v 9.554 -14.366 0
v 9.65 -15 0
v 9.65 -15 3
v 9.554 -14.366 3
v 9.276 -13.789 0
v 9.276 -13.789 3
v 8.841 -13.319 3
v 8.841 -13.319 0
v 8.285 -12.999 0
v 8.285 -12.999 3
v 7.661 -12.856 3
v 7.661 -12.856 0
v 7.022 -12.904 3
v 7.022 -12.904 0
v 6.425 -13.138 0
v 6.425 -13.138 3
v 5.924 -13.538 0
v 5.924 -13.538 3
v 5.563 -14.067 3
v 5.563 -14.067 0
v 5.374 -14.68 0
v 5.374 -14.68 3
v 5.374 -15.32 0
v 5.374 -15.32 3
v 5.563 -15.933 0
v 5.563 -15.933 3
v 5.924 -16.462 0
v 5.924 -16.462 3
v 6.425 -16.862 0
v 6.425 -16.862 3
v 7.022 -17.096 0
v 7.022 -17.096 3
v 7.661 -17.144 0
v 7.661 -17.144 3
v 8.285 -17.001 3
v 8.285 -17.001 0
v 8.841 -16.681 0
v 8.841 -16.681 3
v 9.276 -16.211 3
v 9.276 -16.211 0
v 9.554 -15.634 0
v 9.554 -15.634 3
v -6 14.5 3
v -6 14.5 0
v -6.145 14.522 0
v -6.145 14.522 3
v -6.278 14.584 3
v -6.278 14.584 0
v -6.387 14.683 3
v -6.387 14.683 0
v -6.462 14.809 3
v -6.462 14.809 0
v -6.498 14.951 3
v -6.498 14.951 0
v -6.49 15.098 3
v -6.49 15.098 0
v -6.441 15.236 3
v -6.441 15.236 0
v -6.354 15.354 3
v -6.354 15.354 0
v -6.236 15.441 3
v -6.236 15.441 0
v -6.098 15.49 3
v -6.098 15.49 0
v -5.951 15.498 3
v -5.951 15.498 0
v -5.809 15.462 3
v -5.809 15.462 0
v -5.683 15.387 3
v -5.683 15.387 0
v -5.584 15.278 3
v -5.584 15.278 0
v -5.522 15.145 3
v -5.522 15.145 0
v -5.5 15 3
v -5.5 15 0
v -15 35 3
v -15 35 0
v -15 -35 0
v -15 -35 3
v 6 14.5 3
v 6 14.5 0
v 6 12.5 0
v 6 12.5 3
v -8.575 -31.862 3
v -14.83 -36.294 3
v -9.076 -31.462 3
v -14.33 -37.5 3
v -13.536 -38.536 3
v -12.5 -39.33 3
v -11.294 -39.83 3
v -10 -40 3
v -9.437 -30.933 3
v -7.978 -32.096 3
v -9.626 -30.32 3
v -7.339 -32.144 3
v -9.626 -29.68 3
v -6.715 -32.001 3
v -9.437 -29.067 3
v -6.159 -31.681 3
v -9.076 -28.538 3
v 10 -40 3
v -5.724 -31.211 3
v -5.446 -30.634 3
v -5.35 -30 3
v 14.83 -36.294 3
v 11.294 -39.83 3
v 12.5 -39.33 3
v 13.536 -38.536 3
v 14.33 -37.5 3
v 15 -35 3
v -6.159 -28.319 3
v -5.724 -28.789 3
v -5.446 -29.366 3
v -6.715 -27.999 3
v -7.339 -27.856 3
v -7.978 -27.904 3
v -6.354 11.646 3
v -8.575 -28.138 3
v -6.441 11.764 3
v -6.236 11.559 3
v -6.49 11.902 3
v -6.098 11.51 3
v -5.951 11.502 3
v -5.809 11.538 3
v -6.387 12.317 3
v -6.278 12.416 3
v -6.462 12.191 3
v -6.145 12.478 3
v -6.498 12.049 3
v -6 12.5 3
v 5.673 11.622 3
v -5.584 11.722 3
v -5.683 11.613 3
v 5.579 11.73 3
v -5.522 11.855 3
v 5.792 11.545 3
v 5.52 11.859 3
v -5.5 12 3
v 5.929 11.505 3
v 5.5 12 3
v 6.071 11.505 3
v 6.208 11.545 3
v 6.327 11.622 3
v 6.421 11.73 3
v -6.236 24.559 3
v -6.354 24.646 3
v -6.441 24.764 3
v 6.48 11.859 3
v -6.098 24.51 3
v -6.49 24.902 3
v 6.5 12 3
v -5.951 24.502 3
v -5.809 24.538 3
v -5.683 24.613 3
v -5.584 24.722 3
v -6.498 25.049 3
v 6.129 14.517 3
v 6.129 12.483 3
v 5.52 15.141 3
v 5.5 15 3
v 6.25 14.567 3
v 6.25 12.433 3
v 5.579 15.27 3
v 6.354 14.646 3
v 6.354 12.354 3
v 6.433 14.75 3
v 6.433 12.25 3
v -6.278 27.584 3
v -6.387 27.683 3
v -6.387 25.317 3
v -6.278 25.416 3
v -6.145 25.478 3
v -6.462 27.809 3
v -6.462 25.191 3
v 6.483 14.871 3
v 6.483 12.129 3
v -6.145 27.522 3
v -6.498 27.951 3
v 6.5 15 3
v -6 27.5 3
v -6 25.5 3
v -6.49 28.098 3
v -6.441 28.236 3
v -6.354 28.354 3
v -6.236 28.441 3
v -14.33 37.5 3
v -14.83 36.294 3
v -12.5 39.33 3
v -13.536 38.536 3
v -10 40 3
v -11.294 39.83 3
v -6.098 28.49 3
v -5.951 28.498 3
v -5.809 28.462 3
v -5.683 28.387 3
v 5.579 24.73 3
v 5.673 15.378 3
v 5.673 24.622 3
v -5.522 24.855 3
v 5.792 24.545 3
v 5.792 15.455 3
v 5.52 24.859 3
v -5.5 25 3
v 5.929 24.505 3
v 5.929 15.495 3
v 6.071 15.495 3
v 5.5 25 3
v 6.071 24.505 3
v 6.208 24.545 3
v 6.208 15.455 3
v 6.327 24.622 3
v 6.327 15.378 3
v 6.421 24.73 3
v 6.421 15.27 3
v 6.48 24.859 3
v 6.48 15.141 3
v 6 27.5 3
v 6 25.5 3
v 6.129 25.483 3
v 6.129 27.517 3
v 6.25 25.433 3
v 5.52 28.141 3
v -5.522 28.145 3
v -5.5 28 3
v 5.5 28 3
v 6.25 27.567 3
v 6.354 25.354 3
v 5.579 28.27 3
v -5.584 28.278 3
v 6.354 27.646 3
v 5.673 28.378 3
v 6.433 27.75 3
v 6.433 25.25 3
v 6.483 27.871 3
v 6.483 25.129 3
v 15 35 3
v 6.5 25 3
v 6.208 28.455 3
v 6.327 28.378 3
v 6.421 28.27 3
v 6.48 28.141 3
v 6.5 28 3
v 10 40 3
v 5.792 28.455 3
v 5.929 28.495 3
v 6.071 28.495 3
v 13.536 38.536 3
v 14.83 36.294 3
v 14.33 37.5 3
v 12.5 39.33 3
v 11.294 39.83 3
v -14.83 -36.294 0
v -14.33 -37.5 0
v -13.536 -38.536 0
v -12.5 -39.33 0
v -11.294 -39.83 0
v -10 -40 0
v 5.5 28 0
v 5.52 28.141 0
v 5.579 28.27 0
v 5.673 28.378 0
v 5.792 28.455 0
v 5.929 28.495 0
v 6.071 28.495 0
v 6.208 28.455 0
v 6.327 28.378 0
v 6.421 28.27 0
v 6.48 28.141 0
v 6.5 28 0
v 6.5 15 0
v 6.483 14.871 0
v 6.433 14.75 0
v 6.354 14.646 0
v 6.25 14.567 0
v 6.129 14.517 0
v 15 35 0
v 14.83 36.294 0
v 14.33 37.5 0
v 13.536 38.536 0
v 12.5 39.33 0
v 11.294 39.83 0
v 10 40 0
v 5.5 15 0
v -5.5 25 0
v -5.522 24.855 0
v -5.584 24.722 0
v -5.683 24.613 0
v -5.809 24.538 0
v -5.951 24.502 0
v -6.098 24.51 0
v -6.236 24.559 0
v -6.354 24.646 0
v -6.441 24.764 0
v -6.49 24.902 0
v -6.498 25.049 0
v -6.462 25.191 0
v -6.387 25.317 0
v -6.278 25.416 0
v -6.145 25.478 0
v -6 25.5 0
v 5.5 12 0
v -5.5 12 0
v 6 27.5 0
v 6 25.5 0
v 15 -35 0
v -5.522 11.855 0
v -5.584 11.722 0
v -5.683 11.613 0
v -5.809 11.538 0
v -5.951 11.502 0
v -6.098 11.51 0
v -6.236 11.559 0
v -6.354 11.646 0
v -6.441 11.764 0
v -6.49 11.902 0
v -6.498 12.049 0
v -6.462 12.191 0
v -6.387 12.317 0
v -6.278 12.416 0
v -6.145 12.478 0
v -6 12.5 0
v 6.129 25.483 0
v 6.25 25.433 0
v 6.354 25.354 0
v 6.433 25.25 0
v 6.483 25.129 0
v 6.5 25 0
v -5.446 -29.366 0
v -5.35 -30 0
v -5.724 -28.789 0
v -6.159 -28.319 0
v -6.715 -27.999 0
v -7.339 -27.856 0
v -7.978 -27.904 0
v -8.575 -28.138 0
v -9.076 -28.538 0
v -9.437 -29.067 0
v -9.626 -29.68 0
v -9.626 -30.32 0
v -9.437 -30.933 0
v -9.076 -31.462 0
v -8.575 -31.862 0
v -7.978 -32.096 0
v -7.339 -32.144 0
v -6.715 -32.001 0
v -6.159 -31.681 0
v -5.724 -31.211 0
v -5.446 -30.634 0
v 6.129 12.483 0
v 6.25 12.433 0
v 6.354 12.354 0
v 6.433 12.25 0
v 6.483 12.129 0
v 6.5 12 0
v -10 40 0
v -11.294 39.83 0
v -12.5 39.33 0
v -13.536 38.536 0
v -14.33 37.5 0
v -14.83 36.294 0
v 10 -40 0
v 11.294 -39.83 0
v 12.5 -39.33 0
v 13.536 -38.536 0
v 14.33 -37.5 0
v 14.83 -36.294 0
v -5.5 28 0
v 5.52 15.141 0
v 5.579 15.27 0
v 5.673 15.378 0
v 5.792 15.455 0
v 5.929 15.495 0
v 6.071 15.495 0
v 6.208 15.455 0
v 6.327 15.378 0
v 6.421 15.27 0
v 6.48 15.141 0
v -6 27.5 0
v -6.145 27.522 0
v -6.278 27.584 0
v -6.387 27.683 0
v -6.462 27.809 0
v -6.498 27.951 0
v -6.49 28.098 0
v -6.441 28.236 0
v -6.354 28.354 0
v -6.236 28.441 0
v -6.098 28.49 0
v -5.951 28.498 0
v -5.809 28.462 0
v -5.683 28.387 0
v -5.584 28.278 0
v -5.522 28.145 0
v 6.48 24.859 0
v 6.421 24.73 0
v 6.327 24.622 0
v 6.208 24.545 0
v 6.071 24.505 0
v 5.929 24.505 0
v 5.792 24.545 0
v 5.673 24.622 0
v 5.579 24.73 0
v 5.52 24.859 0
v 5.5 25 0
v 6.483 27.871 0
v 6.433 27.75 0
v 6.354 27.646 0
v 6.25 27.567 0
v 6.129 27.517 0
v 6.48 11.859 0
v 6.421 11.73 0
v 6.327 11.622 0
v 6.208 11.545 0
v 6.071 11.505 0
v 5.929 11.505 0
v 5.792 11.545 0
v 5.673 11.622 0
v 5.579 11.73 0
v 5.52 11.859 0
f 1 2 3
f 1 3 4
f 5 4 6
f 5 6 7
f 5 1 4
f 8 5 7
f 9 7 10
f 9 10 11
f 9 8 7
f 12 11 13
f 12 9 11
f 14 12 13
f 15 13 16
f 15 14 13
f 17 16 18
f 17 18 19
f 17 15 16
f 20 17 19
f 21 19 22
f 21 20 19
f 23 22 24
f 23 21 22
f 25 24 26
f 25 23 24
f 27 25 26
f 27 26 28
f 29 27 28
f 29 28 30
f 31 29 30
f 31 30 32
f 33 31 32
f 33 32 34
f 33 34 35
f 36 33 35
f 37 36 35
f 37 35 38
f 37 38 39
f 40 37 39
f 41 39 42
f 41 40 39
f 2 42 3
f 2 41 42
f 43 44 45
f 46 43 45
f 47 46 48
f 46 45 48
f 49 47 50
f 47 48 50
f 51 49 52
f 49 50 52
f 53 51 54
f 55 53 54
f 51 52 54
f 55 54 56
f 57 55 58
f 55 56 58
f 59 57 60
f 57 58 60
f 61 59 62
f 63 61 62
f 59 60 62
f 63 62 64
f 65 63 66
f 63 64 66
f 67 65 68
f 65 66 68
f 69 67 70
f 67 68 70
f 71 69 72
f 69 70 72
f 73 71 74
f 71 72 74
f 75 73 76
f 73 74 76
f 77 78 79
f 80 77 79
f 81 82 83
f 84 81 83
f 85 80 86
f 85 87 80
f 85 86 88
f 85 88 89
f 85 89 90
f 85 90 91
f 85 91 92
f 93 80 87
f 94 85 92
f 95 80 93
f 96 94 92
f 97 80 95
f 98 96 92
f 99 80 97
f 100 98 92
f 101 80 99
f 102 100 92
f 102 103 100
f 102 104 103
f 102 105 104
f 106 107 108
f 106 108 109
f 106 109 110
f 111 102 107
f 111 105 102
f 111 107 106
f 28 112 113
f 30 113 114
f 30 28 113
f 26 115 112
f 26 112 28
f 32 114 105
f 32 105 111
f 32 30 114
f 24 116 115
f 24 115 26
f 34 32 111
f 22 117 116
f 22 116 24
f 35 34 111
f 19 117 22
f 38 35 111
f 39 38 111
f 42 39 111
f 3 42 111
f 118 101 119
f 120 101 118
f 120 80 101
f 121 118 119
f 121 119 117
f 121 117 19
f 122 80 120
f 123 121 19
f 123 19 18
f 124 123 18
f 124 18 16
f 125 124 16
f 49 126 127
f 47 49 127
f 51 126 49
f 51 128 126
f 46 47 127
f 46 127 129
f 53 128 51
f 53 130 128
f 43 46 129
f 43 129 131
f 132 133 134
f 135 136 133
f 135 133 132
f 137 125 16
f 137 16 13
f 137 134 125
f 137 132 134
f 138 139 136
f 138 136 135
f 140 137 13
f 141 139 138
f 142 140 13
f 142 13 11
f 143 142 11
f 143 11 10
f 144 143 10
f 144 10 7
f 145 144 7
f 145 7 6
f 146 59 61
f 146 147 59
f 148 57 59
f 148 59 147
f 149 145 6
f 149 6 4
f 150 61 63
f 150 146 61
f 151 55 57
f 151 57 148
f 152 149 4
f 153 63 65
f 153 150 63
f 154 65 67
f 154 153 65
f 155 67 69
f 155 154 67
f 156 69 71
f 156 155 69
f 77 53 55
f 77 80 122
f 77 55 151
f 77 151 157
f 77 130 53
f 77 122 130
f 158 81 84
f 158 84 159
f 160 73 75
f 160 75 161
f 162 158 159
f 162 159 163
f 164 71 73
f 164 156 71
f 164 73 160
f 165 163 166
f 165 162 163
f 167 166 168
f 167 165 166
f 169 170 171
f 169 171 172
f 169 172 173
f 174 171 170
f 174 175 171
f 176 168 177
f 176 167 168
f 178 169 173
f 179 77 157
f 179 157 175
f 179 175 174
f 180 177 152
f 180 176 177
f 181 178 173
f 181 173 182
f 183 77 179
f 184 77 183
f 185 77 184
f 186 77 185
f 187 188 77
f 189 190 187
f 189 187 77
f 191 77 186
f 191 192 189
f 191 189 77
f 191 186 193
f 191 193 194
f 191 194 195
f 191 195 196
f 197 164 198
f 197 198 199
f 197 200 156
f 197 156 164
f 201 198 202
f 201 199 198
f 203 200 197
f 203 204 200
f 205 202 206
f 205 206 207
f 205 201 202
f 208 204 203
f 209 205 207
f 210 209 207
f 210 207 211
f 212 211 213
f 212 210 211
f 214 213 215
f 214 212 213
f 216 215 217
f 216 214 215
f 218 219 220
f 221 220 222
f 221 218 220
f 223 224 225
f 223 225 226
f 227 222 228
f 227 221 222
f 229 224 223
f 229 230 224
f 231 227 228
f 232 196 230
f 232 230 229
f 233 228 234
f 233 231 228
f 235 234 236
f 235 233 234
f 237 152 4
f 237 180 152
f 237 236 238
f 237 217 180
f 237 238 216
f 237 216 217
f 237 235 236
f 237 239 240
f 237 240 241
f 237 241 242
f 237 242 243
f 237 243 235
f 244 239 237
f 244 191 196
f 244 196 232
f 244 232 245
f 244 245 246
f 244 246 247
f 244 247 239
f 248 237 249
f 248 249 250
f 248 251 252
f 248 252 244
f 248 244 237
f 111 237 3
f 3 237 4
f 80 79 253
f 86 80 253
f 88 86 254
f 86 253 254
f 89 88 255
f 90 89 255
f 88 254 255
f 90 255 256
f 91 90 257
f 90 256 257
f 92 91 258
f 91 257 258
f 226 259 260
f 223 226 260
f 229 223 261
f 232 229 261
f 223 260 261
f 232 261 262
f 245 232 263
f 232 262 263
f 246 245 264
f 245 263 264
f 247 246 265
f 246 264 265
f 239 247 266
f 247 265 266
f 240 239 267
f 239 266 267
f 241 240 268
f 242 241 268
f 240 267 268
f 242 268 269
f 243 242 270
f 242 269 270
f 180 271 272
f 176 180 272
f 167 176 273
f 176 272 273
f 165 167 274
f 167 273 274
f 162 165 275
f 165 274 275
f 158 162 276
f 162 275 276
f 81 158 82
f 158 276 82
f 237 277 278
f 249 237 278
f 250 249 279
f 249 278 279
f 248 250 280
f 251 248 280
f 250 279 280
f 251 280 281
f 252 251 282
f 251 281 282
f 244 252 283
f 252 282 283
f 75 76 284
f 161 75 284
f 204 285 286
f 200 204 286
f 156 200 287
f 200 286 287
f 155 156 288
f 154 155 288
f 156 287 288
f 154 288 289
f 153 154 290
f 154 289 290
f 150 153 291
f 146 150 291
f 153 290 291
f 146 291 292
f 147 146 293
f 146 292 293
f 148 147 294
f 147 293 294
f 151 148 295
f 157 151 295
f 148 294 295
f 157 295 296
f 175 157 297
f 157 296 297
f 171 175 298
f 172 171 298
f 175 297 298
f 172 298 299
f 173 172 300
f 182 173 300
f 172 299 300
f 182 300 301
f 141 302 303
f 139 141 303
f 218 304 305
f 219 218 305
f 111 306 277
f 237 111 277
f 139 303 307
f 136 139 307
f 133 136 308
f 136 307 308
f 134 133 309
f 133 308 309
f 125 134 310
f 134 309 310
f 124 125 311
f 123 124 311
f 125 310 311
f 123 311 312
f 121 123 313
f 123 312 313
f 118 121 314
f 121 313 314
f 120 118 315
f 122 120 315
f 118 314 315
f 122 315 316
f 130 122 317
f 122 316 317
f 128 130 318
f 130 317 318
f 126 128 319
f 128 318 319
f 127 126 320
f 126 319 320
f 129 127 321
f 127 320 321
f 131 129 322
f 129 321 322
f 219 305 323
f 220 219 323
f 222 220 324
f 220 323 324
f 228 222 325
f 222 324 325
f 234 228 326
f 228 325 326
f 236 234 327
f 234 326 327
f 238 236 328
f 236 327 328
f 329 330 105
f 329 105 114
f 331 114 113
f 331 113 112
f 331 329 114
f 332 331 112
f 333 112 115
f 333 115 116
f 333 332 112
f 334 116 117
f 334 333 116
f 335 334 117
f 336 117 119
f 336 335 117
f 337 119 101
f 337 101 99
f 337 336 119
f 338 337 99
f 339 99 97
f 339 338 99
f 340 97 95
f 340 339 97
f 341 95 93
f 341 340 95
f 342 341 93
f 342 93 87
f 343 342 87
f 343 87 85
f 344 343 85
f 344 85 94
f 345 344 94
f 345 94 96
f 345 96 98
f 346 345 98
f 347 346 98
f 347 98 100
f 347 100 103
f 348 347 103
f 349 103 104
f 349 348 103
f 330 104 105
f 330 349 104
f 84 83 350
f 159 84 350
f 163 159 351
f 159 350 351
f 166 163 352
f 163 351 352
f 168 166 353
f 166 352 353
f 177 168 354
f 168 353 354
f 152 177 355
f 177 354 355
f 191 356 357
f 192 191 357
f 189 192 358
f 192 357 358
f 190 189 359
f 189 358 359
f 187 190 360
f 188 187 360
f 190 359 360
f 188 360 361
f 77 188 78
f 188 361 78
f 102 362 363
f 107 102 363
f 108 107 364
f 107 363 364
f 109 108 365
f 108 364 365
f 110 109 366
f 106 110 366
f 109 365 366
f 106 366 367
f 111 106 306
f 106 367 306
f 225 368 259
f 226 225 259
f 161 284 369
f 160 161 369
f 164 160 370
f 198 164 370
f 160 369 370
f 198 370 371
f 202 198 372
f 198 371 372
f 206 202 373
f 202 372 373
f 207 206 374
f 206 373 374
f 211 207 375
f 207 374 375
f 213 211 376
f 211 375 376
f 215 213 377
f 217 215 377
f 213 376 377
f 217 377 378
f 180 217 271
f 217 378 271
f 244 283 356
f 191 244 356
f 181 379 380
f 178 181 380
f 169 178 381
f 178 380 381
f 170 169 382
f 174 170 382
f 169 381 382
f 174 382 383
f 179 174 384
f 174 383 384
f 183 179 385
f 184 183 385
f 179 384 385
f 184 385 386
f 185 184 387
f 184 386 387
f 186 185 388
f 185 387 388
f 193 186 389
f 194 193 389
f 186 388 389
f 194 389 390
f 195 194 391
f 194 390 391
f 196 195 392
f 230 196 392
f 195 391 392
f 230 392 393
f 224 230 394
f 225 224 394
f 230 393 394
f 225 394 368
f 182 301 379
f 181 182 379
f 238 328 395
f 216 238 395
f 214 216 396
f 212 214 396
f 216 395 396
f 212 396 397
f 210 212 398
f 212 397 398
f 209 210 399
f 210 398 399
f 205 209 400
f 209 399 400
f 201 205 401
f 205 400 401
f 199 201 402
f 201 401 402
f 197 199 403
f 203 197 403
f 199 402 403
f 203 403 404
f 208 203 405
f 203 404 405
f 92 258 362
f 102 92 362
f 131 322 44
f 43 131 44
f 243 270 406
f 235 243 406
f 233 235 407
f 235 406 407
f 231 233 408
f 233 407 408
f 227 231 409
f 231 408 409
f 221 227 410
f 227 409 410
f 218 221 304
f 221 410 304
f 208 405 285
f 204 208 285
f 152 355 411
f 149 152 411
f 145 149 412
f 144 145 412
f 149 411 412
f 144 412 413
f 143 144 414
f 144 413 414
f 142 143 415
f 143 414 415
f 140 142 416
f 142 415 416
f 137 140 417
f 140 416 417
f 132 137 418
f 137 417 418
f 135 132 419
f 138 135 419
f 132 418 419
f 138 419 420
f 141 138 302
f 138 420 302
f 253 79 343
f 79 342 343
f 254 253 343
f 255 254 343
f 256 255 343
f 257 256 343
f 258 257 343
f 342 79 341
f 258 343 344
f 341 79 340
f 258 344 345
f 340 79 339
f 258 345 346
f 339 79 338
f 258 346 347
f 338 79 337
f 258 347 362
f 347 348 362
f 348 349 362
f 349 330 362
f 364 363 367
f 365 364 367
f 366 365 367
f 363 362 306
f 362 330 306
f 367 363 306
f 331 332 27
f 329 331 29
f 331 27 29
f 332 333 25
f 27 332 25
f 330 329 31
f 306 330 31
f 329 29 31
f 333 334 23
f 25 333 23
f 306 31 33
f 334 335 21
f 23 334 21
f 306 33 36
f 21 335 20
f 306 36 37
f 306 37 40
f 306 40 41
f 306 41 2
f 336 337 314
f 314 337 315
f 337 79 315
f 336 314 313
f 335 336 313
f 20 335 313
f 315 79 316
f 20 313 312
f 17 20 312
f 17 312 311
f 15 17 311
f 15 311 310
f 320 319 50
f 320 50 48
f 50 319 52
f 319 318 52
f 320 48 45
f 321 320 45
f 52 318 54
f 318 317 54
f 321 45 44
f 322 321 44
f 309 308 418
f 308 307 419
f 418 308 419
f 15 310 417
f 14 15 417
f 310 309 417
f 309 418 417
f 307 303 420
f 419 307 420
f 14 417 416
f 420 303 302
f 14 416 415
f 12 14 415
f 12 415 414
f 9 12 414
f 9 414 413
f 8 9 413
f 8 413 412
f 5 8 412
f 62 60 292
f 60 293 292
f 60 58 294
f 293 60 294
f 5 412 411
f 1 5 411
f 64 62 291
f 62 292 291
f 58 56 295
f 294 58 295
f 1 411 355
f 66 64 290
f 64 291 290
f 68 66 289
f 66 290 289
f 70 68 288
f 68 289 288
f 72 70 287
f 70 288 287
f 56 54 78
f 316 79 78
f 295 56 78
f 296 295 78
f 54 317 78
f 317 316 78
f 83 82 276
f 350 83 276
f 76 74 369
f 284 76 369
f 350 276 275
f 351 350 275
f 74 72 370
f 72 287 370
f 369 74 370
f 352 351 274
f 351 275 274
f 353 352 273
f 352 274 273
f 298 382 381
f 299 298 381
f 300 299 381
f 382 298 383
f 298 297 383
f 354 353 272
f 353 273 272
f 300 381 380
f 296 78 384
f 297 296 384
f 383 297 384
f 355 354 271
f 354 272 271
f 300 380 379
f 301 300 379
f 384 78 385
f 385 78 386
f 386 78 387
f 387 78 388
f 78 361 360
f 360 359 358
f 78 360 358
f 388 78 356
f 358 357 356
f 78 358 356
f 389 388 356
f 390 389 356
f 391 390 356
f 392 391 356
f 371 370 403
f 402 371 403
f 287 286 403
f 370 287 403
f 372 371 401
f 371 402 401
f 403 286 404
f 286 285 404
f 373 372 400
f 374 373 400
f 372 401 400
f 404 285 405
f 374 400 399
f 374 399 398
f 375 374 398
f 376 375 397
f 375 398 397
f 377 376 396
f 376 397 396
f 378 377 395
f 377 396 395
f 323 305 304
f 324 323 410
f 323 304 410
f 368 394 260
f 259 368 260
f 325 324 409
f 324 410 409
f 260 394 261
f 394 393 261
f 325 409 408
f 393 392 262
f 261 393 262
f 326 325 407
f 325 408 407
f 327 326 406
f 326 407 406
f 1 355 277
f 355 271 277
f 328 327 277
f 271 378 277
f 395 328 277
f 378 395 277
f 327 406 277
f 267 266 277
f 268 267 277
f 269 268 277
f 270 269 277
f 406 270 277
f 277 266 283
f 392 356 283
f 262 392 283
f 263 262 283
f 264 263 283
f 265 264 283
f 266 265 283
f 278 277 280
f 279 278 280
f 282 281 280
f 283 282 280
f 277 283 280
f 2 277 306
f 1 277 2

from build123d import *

# Parameters (mm, degrees)
F0_R     = 2.15
F1_DEPTH = 3


with BuildPart() as f1:
    # F0 (on Top) → F1 (new body)
    with BuildSketch(Plane.XY):
        with BuildLine():
            ThreePointArc((15, 35), (13.535534, 38.535534), (10, 40))
            Line((10, 40), (-10, 40))
            ThreePointArc((-10, 40), (-13.535534, 38.535534), (-15, 35))
            Line((-15, 35), (-15, -35))
            ThreePointArc((-15, -35), (-13.535534, -38.535534), (-10, -40))
            Line((-10, -40), (10, -40))
            ThreePointArc((10, -40), (13.535534, -38.535534), (15, -35))
            Line((15, -35), (15, 35))
        make_face()
        with Locations((-7.5, -30)):
            Circle(F0_R, mode=Mode.SUBTRACT)
        with Locations((7.5, -15)):
            Circle(F0_R, mode=Mode.SUBTRACT)
        with BuildLine():
            Line((5.5, 12), (-5.5, 12))
            ThreePointArc((-5.5, 12), (-6.353553, 11.646447), (-6, 12.5))
            Line((-6, 12.5), (-6, 14.5))
            ThreePointArc((-6, 14.5), (-6.353553, 15.353553), (-5.5, 15))
            Line((-5.5, 15), (5.5, 15))
            ThreePointArc((5.5, 15), (6, 15.5), (6.5, 15))
            ThreePointArc((6.5, 15), (6.353553, 14.646447), (6, 14.5))
            Line((6, 14.5), (6, 12.5))
            ThreePointArc((6, 12.5), (6.353553, 12.353553), (6.5, 12))
            ThreePointArc((6.5, 12), (6, 11.5), (5.5, 12))
        make_face(mode=Mode.SUBTRACT)
        with BuildLine():
            Line((5.5, 25), (-5.5, 25))
            ThreePointArc((-5.5, 25), (-6.353553, 24.646447), (-6, 25.5))
            Line((-6, 25.5), (-6, 27.5))
            ThreePointArc((-6, 27.5), (-6.353553, 28.353553), (-5.5, 28))
            Line((-5.5, 28), (5.5, 28))
            ThreePointArc((5.5, 28), (6, 28.5), (6.5, 28))
            ThreePointArc((6.5, 28), (6.353553, 27.646447), (6, 27.5))
            Line((6, 27.5), (6, 25.5))
            ThreePointArc((6, 25.5), (6.353553, 25.353553), (6.5, 25))
            ThreePointArc((6.5, 25), (6, 24.5), (5.5, 25))
        make_face(mode=Mode.SUBTRACT)
    extrude(amount=F1_DEPTH)


solid = f1.part
